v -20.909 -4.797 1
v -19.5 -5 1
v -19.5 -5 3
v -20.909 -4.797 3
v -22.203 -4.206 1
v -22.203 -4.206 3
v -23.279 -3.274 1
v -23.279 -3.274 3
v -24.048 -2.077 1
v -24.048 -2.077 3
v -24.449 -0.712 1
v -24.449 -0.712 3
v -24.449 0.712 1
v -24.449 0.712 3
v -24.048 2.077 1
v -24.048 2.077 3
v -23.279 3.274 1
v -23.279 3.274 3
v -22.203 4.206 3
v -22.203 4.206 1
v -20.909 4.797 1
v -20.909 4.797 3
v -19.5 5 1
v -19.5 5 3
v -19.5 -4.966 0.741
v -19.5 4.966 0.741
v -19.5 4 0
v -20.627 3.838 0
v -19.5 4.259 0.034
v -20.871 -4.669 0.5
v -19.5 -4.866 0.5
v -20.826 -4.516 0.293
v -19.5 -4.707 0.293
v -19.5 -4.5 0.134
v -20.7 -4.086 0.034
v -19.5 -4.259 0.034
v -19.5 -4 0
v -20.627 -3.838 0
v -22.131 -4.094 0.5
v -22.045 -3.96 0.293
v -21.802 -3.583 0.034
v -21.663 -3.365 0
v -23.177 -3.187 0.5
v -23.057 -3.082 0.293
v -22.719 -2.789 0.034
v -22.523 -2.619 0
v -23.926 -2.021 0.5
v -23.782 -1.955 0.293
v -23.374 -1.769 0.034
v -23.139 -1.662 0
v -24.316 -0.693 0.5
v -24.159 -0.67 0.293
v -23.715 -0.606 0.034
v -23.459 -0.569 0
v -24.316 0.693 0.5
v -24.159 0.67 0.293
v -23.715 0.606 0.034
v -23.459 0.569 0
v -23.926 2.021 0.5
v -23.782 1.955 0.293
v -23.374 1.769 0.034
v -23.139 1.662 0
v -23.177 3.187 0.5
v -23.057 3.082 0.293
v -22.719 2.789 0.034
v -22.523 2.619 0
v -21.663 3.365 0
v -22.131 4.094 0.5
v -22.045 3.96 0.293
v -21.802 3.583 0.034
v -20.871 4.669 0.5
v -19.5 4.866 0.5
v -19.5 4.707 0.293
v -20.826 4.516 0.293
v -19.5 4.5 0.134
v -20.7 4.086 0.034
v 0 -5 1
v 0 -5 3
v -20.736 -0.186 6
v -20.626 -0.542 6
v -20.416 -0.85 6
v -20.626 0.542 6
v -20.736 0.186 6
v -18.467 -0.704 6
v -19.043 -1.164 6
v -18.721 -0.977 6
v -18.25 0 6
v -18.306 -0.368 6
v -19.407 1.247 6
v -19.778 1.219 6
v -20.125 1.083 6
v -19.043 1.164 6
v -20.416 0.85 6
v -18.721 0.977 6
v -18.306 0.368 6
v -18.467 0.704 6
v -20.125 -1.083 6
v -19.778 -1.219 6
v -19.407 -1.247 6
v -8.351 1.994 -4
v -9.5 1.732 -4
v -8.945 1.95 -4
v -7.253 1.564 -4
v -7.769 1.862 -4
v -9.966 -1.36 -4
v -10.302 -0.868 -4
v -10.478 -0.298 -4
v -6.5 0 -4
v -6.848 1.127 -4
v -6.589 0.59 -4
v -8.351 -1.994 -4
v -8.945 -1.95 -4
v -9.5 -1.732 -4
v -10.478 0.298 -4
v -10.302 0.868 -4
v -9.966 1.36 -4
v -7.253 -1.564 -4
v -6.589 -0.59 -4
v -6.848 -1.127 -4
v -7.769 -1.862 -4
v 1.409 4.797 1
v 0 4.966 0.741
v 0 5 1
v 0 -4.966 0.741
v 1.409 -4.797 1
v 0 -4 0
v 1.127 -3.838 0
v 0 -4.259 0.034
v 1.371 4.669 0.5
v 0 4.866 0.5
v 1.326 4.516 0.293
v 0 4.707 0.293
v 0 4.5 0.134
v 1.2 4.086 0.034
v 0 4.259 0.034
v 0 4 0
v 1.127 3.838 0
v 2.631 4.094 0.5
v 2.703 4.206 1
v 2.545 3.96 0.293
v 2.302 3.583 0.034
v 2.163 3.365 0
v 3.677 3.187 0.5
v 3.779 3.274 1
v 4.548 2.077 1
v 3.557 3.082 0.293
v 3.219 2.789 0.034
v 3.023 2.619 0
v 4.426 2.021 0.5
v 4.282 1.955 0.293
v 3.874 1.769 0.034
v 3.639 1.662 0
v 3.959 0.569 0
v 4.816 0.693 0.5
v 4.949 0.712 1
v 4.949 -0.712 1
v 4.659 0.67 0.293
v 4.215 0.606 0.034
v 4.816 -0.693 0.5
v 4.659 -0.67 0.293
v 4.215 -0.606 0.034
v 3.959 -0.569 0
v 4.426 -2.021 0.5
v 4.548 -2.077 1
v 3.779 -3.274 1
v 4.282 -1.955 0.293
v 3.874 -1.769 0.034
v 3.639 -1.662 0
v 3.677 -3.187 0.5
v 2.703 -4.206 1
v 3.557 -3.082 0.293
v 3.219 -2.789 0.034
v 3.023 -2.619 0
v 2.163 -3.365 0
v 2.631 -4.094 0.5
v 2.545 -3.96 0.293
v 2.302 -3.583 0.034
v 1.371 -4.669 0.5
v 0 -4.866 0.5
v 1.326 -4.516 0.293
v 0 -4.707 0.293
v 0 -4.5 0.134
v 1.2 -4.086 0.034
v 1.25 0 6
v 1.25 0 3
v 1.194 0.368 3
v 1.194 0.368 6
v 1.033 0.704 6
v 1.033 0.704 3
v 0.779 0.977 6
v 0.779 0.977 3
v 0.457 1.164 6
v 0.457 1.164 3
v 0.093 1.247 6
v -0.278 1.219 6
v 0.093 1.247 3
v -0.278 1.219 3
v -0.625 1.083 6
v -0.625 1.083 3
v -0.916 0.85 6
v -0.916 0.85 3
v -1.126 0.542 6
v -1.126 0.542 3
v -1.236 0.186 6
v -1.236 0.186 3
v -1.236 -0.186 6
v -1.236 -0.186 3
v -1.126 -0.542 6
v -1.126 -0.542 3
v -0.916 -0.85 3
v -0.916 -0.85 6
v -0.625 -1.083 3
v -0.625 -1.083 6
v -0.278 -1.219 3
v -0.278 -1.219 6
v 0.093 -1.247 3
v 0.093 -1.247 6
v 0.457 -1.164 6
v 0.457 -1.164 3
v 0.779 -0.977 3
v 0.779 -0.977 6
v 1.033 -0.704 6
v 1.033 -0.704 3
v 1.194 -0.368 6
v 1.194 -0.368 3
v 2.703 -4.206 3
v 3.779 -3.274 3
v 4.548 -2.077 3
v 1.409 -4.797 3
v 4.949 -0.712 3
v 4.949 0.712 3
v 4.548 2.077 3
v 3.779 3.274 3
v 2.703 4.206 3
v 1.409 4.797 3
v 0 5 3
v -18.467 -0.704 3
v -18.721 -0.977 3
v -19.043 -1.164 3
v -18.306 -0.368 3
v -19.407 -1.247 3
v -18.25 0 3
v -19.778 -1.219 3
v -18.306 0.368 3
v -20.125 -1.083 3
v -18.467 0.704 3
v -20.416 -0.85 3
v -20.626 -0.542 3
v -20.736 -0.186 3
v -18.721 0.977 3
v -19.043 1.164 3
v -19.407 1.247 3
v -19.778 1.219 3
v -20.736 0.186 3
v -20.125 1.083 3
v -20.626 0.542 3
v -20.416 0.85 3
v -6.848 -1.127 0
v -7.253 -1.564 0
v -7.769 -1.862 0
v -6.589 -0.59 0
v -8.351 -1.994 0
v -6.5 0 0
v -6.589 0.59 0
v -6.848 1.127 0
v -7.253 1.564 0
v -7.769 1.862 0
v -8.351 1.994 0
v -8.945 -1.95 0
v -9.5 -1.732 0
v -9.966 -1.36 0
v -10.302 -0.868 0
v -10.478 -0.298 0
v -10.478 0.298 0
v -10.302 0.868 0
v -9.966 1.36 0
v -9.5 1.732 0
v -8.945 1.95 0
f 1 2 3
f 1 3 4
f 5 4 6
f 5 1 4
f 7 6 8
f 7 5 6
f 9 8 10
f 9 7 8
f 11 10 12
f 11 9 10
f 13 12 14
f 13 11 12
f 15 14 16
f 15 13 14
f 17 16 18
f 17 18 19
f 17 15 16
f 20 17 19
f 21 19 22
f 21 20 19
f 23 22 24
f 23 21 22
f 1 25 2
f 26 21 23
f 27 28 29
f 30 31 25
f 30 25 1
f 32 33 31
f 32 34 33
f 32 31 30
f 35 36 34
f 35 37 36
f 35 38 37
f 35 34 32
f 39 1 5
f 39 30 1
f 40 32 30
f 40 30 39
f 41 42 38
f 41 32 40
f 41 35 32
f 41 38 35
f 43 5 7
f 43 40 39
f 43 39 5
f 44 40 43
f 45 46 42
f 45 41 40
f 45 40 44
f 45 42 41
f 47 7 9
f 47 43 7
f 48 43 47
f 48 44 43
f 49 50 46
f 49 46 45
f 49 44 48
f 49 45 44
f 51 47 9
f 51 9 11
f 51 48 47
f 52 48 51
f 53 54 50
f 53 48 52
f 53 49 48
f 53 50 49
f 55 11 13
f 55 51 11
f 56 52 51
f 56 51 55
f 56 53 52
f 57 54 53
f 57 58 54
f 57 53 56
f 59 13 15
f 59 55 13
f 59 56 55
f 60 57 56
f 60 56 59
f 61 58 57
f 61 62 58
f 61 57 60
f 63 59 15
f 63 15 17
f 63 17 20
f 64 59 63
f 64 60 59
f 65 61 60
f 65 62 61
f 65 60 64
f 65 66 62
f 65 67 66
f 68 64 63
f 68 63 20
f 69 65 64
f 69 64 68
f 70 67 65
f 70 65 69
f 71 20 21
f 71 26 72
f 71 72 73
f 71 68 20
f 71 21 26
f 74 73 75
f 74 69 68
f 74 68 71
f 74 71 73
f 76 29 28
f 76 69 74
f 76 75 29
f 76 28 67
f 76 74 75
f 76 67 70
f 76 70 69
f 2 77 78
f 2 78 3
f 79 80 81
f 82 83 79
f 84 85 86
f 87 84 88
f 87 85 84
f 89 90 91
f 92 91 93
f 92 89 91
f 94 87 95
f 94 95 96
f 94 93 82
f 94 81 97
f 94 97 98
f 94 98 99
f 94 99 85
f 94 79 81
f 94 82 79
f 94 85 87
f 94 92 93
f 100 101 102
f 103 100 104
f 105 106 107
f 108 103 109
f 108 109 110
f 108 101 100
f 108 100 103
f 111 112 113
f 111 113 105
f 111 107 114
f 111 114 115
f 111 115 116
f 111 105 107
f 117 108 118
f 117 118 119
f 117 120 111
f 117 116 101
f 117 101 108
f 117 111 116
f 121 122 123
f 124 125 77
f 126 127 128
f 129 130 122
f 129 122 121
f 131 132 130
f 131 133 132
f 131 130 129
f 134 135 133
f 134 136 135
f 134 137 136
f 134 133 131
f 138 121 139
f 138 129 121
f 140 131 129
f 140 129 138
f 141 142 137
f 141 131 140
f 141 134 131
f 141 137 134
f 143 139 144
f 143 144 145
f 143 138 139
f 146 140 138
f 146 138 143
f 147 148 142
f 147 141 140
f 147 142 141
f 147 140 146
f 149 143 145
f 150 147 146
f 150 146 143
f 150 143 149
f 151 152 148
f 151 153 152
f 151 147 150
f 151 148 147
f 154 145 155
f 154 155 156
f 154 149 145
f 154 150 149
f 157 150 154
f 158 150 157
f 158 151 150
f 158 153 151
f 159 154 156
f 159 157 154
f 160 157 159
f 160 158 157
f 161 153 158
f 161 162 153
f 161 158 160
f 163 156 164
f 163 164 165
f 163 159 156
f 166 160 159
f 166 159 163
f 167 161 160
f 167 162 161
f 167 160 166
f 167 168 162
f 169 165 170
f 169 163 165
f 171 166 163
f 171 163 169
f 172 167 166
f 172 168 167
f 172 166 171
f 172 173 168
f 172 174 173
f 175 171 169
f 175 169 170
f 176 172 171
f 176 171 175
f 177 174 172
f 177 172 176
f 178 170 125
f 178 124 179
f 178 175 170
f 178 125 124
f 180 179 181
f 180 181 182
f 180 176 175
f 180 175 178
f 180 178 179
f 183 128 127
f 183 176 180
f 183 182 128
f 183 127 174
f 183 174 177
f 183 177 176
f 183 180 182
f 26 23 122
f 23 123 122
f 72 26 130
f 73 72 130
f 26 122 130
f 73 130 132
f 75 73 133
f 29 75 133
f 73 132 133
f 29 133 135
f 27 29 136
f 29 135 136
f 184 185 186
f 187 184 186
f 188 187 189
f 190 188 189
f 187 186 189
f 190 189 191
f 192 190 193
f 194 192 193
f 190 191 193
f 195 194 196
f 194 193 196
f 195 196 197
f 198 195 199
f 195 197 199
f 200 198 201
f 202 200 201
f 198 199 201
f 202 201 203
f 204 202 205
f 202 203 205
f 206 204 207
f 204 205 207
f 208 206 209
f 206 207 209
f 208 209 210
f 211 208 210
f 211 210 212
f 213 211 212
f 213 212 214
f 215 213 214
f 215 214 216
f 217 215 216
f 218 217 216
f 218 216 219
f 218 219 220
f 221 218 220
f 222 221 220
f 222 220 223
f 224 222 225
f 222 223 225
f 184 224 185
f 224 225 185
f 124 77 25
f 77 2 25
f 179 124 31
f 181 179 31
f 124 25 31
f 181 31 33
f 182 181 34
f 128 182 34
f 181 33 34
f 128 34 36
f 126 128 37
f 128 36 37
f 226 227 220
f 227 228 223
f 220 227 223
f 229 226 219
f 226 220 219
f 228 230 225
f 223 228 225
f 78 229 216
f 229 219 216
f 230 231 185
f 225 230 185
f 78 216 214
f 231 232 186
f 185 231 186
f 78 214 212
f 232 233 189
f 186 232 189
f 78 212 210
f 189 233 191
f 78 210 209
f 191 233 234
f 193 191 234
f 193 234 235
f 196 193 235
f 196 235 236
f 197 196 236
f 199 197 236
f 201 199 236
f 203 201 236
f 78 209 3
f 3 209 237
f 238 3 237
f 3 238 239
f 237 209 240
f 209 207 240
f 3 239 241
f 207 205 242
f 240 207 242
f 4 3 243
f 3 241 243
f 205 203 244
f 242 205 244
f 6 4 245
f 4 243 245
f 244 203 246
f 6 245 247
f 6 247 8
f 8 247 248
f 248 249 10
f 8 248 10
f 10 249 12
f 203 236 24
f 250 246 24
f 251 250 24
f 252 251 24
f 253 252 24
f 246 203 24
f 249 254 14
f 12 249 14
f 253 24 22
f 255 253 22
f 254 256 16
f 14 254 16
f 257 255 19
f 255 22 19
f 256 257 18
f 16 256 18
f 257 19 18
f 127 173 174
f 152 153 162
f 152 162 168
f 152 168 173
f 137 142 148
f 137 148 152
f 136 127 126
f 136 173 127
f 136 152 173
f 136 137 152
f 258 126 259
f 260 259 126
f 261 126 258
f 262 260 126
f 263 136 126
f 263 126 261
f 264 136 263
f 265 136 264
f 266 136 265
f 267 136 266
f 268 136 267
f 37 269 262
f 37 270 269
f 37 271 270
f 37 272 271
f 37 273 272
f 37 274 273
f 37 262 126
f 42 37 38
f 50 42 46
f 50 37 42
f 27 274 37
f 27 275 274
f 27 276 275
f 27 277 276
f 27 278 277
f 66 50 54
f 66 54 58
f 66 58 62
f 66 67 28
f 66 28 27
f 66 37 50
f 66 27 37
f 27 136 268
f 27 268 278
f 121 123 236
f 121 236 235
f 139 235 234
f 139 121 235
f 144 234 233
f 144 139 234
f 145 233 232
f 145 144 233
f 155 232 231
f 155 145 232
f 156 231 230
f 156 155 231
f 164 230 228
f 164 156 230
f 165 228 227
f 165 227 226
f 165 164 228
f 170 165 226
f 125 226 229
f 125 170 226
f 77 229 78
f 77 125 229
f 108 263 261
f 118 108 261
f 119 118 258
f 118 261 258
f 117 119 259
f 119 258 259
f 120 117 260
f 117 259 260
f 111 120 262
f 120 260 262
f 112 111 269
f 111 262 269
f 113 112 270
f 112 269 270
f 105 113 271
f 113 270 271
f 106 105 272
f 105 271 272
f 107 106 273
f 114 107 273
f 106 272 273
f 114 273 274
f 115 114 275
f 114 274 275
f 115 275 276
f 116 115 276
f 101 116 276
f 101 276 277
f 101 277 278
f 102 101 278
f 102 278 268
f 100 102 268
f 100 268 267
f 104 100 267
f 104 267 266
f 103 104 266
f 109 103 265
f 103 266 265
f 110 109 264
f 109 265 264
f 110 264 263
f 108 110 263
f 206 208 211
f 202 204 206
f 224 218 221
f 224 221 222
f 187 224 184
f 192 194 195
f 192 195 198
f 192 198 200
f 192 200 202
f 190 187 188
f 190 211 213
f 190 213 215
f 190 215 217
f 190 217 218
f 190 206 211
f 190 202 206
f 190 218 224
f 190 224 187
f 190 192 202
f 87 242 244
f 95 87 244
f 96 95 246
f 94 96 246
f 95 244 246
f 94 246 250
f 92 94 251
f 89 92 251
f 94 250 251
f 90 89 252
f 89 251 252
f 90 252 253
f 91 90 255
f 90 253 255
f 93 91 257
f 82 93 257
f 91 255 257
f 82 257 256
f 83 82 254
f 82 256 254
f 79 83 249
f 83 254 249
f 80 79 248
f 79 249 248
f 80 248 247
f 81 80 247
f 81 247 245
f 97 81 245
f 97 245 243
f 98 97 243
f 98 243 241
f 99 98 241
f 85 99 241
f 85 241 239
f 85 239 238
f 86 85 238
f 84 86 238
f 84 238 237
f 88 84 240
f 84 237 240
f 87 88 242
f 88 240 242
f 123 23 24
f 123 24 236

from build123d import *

# Parameters (mm, degrees)
BOSS_EXTRU_1_DEPTH = 3
ESQUISSE2_R        = 1.25
BOSS_EXTRU_2_DEPTH = 3
ESQUISSE3_R        = 2
BOSS_EXTRU_3_DEPTH = 4
CONG_1_R           = 1


with BuildPart() as part:
    # Esquisse1 → Boss.-Extru.1 (new body)
    with BuildSketch(Plane.XY):
        with BuildLine():
            Line((0, -5), (-19.5, -5))
            ThreePointArc((-19.5, -5), (-24.5, 0), (-19.5, 5))
            Line((-19.5, 5), (0, 5))
            ThreePointArc((0, 5), (5, 0), (0, -5))
        make_face()
    extrude(amount=BOSS_EXTRU_1_DEPTH)

    # Esquisse2 → Boss.-Extru.2 (add)
    with BuildSketch(Plane.XY.offset(3)):
        with Locations((-19.5, 0)):
            Circle(ESQUISSE2_R)
        Circle(ESQUISSE2_R)
    extrude(amount=BOSS_EXTRU_2_DEPTH)

    # Esquisse3 → Boss.-Extru.3 (add)
    with BuildSketch(Plane(origin=(0, 0, 0), x_dir=(-1, 0, 0), z_dir=(0, 0, -1))):
        with Locations(Location((8.5, 0, 0), (0, 0, 180))):
            Circle(ESQUISSE3_R)
    extrude(amount=BOSS_EXTRU_3_DEPTH)

    # Congé1
    cong_1_edges = [part.edges().sort_by_distance(p)[0] for p in [
        (-9.75, -5, 0),
        (-24.5, 0, 0),
        (-9.75, 5, 0),
        (5, 0, 0),
    ]]
    fillet(cong_1_edges, radius=CONG_1_R)


solid = part.part
